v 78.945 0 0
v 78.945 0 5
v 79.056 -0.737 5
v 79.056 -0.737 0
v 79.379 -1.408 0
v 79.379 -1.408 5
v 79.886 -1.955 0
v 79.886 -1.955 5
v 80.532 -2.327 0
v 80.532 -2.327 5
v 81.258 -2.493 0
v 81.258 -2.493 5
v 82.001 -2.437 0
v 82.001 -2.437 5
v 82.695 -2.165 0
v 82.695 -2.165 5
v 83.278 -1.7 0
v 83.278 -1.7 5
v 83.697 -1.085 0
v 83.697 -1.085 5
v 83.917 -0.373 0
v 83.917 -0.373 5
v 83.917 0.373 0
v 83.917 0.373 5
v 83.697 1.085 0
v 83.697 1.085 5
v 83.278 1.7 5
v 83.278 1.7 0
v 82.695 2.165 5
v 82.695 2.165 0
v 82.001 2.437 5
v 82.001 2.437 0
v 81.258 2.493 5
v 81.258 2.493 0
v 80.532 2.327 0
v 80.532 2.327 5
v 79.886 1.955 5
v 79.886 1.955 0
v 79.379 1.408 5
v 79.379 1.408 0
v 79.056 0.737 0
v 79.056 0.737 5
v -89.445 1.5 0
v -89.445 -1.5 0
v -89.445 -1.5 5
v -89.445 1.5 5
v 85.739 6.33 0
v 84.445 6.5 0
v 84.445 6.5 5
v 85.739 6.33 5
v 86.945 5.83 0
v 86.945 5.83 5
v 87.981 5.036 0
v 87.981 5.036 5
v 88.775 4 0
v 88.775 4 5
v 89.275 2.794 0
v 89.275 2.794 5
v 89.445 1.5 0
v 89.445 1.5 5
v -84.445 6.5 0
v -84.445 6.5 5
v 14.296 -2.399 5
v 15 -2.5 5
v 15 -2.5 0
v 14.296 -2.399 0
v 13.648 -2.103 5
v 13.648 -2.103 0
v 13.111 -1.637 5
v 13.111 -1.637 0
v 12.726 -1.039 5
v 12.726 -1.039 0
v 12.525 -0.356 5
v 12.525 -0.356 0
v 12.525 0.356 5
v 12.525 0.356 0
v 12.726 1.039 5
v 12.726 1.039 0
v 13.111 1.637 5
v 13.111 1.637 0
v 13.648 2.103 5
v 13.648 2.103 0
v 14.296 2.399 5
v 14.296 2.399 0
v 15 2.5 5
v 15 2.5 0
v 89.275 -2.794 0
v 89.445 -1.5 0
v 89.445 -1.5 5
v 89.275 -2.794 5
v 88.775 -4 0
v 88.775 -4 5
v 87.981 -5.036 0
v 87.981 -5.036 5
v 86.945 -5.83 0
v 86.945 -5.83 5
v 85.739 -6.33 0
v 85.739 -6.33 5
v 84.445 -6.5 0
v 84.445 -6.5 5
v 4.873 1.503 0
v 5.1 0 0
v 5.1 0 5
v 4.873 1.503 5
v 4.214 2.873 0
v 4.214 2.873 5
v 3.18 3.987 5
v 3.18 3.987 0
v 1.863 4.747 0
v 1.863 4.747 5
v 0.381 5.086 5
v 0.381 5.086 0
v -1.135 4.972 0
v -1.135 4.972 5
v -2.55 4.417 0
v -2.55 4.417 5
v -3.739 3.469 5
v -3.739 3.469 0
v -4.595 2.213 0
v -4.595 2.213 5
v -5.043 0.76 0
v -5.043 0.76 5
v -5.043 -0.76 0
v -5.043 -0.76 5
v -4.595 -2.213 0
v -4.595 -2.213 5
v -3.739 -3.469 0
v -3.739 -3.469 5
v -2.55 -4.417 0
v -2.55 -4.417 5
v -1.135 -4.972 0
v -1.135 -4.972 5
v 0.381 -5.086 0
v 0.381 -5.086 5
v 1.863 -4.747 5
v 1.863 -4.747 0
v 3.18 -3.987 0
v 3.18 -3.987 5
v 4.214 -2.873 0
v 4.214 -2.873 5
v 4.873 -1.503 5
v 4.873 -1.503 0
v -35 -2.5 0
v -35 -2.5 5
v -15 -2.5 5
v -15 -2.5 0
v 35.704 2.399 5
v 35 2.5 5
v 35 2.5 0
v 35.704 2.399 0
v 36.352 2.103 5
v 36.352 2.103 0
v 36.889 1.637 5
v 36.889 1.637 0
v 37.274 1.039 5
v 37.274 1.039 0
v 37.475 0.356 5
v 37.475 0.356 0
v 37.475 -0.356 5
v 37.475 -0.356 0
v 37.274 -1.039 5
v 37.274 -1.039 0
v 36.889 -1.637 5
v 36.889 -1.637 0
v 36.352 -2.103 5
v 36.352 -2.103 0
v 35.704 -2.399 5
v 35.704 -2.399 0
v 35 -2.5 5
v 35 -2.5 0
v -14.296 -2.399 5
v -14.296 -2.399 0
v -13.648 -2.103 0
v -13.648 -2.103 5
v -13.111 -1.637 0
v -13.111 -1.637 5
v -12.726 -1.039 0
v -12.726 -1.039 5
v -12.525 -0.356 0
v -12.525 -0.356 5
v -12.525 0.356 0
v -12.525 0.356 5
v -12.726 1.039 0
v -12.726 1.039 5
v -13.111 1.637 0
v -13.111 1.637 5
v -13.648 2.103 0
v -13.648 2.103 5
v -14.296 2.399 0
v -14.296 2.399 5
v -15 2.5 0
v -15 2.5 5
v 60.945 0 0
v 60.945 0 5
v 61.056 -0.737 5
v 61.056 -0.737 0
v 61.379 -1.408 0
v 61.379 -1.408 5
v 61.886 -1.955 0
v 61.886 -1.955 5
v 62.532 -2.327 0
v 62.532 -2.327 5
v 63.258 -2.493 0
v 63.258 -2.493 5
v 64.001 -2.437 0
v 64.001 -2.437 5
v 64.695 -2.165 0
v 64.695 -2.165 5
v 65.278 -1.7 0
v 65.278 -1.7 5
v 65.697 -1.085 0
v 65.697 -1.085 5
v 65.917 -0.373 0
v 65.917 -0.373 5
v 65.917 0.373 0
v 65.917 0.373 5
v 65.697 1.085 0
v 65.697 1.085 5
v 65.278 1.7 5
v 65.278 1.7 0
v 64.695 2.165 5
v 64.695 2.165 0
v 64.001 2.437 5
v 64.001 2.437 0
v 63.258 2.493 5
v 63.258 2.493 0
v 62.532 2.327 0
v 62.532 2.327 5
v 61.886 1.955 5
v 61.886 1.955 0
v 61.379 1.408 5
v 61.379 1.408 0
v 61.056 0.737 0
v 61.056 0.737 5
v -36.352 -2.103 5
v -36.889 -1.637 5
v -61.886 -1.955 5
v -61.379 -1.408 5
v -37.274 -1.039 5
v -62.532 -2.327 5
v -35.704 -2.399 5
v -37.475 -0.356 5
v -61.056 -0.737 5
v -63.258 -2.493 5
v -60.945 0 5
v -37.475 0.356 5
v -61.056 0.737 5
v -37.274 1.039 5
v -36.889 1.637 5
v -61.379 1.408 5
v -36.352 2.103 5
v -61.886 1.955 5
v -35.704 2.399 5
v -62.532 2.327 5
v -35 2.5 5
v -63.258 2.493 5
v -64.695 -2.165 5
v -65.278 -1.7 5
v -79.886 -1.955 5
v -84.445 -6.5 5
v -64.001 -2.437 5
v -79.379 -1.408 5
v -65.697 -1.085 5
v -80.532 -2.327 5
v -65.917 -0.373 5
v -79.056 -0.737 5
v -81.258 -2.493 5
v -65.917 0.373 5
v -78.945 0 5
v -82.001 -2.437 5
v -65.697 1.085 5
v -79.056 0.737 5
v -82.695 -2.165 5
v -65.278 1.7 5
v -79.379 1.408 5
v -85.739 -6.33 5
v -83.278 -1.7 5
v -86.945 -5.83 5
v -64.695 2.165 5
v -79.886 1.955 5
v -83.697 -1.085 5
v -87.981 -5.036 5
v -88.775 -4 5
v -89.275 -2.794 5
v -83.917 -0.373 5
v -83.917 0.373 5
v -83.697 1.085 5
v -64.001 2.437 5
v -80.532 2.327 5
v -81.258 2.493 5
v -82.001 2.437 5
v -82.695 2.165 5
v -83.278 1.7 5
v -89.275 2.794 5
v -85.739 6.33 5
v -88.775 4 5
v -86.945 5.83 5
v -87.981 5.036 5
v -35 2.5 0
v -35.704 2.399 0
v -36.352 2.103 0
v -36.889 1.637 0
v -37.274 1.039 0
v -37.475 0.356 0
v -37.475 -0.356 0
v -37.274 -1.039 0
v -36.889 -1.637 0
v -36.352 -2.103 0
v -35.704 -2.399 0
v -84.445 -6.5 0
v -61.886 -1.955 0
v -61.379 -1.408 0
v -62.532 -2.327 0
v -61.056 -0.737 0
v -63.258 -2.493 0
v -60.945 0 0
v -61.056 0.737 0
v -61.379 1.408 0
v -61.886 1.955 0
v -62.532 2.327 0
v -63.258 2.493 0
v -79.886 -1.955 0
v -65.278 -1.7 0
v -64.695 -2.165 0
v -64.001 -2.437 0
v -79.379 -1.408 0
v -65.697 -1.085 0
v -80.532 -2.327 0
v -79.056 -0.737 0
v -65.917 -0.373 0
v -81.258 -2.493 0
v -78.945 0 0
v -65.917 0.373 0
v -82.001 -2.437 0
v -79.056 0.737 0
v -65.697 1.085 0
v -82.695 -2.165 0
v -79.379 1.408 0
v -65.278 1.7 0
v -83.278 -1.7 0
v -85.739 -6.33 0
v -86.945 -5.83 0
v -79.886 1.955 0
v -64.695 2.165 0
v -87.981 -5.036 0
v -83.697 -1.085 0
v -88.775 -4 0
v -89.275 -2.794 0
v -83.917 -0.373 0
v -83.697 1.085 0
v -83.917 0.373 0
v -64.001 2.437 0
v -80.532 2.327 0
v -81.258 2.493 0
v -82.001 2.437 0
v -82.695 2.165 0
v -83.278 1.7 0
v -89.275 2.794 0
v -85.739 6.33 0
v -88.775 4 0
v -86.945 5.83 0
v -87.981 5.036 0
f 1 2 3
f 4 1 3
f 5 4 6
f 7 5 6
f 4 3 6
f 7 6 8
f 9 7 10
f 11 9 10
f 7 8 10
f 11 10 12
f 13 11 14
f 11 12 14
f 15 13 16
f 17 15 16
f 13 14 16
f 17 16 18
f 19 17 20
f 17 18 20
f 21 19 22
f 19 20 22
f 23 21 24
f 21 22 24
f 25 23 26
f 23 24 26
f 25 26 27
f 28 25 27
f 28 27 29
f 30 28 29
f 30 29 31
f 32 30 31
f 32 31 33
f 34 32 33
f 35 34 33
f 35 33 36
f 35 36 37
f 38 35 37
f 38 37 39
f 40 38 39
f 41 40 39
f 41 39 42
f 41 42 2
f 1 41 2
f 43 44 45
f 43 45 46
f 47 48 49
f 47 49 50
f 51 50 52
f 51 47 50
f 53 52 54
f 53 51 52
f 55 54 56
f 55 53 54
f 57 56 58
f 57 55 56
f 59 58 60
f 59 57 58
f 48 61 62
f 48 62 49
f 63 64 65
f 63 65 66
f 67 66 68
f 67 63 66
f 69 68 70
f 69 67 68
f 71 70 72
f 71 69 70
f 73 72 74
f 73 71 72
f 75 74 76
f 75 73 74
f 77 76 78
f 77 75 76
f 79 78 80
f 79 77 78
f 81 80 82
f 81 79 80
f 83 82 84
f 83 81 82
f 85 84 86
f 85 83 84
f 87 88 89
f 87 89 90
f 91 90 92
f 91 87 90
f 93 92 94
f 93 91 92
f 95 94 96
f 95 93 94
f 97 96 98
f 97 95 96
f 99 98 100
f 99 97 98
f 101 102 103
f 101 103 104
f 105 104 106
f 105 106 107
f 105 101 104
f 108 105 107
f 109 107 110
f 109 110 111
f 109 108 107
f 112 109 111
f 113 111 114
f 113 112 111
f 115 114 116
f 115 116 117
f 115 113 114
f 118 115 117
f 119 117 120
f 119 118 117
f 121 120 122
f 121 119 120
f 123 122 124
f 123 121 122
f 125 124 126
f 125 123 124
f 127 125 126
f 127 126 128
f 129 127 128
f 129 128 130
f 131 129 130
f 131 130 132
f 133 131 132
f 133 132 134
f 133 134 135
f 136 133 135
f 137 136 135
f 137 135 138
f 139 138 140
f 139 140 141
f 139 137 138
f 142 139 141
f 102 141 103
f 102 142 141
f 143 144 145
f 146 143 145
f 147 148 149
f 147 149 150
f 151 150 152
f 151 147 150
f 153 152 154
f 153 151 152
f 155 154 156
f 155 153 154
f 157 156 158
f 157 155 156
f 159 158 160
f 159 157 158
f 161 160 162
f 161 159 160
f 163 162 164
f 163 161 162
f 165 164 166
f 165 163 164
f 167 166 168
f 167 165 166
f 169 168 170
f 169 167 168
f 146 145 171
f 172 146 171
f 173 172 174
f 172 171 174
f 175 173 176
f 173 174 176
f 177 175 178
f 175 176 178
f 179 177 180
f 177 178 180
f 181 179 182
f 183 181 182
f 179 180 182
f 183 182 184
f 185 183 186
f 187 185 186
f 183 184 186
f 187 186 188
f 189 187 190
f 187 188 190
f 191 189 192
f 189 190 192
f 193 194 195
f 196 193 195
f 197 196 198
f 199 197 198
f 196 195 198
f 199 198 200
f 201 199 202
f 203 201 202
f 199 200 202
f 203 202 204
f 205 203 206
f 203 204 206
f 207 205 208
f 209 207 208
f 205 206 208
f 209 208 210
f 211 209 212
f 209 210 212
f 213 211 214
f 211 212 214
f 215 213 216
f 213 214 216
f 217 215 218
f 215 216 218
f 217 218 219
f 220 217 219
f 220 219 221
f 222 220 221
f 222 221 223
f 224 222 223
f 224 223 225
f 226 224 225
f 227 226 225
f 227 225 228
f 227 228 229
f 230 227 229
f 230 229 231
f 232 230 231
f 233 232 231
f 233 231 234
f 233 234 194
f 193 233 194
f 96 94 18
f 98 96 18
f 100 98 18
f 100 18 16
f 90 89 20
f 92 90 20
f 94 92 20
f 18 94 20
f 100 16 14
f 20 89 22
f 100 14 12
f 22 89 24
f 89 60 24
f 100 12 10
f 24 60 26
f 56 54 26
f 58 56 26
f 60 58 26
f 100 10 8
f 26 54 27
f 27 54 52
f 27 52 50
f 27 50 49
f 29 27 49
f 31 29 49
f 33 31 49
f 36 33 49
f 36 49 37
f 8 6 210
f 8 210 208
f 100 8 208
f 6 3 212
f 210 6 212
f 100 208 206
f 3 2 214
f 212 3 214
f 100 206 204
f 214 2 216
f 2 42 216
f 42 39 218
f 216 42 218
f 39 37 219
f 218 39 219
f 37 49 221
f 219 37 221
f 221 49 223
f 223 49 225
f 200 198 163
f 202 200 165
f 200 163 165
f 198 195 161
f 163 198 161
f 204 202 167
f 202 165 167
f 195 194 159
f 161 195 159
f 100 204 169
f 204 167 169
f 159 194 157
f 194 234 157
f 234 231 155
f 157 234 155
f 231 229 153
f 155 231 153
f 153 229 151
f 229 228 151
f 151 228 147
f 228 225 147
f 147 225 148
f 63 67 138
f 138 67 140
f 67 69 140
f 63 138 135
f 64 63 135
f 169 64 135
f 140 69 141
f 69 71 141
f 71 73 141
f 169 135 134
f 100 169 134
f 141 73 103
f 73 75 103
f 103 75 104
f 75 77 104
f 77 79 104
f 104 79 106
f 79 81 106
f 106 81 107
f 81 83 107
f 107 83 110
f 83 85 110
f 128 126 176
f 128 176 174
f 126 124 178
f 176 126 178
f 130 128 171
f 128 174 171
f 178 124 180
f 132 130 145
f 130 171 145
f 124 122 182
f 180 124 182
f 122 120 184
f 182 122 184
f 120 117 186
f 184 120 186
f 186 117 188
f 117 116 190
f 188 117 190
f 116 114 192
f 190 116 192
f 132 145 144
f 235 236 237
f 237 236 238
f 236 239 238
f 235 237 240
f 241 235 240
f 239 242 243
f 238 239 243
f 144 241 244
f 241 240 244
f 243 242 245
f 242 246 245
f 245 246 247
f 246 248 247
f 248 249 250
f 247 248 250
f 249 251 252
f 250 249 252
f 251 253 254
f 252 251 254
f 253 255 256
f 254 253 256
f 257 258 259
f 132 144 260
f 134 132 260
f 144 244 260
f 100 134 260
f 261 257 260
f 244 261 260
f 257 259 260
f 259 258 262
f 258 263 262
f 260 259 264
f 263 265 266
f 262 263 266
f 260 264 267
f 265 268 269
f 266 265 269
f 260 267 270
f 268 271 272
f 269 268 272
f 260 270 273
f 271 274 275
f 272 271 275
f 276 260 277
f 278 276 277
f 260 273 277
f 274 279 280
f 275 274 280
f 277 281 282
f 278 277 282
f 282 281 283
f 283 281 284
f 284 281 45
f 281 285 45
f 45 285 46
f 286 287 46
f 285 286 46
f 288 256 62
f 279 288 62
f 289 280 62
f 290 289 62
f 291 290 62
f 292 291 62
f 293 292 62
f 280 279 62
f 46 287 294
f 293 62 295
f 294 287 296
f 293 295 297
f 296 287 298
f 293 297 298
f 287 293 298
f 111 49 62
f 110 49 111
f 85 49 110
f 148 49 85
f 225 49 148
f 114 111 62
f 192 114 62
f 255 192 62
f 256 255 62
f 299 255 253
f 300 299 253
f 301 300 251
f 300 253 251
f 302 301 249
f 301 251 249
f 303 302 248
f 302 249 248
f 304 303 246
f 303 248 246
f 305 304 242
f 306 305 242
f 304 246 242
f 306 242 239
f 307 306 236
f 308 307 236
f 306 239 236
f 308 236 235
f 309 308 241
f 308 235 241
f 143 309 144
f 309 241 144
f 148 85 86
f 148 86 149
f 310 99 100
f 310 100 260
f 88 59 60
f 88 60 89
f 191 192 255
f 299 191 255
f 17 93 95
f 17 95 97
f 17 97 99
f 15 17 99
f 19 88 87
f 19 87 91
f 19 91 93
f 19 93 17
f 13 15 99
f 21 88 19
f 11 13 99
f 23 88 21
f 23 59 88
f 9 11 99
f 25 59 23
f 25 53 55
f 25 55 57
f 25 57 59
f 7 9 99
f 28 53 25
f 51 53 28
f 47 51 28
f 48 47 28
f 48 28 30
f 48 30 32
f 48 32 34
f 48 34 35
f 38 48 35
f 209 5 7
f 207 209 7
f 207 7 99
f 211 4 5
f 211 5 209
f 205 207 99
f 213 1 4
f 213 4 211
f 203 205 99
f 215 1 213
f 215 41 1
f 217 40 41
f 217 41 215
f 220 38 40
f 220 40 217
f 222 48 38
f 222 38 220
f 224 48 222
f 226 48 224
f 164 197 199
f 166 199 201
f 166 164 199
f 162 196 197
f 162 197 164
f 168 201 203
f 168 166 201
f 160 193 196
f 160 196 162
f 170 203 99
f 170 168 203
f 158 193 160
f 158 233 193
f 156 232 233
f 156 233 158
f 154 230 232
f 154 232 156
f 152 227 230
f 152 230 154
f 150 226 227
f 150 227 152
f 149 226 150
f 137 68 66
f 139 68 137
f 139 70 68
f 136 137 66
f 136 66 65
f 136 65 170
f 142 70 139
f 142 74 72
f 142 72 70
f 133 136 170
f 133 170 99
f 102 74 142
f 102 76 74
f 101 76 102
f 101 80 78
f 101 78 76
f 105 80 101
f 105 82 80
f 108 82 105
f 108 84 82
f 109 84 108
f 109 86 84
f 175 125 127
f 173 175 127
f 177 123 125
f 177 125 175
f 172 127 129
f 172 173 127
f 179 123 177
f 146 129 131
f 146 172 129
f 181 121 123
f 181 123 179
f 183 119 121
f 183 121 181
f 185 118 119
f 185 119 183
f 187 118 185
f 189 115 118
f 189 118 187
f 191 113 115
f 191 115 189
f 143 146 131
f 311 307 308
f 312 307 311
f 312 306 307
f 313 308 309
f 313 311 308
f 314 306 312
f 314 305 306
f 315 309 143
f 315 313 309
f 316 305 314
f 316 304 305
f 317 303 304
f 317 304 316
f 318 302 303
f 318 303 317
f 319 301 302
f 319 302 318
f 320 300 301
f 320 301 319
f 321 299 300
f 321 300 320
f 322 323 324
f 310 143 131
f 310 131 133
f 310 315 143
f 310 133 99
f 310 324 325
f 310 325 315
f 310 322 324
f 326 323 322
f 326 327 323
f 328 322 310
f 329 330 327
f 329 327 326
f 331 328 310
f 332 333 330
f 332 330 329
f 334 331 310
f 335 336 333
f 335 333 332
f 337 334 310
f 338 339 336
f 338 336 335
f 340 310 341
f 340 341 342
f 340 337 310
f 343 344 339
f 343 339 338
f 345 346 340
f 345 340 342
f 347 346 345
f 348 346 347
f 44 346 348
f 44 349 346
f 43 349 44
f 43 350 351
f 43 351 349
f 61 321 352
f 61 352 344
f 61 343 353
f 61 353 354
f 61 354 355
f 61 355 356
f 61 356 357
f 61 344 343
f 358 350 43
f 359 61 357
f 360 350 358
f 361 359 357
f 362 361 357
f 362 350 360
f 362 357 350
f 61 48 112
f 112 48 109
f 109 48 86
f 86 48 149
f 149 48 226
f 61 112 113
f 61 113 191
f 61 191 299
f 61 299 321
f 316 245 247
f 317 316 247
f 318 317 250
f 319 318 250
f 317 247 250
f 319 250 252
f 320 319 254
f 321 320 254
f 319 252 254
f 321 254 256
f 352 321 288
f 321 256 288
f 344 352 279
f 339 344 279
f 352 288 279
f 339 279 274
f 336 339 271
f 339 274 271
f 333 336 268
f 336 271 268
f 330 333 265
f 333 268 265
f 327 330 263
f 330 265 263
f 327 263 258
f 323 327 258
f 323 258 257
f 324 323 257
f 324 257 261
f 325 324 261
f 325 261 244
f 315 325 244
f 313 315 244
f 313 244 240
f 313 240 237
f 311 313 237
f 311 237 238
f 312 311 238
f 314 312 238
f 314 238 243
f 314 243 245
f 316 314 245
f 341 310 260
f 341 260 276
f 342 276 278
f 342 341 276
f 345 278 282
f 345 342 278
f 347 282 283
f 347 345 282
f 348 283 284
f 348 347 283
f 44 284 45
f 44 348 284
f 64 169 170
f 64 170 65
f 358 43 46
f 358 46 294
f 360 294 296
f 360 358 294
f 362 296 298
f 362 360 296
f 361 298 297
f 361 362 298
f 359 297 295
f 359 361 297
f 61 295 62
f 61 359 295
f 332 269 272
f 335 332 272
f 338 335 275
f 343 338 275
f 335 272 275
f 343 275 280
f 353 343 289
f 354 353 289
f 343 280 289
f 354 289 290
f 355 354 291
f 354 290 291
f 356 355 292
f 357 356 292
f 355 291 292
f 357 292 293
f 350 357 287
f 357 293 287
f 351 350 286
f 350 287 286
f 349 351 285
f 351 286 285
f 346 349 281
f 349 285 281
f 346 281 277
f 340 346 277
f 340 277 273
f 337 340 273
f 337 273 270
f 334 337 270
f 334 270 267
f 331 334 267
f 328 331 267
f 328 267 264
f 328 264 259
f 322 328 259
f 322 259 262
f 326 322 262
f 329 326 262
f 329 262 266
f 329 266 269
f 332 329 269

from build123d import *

# Parameters (mm, degrees)
SKETCH1_R           = 5.1
BOSS_EXTRUDE1_DEPTH = 5
SKETCH2_R           = 2.5
CUT_EXTRUDE1_DEPTH  = 35


with BuildPart() as part:
    # Sketch1 → Boss-Extrude1 (new body)
    with BuildSketch(Plane.XY):
        with BuildLine():
            Line((-84.445, 6.5), (84.445, 6.5))
            ThreePointArc((84.445, 6.5), (87.980533906, 5.035533906), (89.445, 1.5))
            Line((89.445, 1.5), (89.445, -1.5))
            ThreePointArc((89.445, -1.5), (87.980533906, -5.035533906), (84.445, -6.5))
            Line((84.445, -6.5), (-84.445, -6.5))
            ThreePointArc((-84.445, -6.5), (-87.980533906, -5.035533906), (-89.445, -1.5))
            Line((-89.445, -1.5), (-89.445, 1.5))
            ThreePointArc((-89.445, 1.5), (-87.980533906, 5.035533906), (-84.445, 6.5))
        make_face()
        Circle(SKETCH1_R, mode=Mode.SUBTRACT)
    extrude(amount=BOSS_EXTRUDE1_DEPTH)

    # Sketch2 → Cut-Extrude1 (cut)
    with BuildSketch(Plane.XY.offset(5)):
        with Locations((-81.445, 0)):
            Circle(SKETCH2_R)
        with Locations((-63.445, 0)):
            Circle(SKETCH2_R)
        with Locations((63.445, 0)):
            Circle(SKETCH2_R)
        with Locations((81.445, 0)):
            Circle(SKETCH2_R)
        with BuildLine():
            Line((15, 2.5), (35, 2.5))
            ThreePointArc((35, 2.5), (37.5, 0), (35, -2.5))
            Line((35, -2.5), (15, -2.5))
            ThreePointArc((15, -2.5), (12.5, 0), (15, 2.5))
        make_face()
        with BuildLine():
            Line((-15, 2.5), (-35, 2.5))
            ThreePointArc((-35, 2.5), (-37.5, 0), (-35, -2.5))
            Line((-35, -2.5), (-15, -2.5))
            ThreePointArc((-15, -2.5), (-12.5, 0), (-15, 2.5))
        make_face()
    extrude(amount=-CUT_EXTRUDE1_DEPTH, mode=Mode.SUBTRACT)


solid = part.part
